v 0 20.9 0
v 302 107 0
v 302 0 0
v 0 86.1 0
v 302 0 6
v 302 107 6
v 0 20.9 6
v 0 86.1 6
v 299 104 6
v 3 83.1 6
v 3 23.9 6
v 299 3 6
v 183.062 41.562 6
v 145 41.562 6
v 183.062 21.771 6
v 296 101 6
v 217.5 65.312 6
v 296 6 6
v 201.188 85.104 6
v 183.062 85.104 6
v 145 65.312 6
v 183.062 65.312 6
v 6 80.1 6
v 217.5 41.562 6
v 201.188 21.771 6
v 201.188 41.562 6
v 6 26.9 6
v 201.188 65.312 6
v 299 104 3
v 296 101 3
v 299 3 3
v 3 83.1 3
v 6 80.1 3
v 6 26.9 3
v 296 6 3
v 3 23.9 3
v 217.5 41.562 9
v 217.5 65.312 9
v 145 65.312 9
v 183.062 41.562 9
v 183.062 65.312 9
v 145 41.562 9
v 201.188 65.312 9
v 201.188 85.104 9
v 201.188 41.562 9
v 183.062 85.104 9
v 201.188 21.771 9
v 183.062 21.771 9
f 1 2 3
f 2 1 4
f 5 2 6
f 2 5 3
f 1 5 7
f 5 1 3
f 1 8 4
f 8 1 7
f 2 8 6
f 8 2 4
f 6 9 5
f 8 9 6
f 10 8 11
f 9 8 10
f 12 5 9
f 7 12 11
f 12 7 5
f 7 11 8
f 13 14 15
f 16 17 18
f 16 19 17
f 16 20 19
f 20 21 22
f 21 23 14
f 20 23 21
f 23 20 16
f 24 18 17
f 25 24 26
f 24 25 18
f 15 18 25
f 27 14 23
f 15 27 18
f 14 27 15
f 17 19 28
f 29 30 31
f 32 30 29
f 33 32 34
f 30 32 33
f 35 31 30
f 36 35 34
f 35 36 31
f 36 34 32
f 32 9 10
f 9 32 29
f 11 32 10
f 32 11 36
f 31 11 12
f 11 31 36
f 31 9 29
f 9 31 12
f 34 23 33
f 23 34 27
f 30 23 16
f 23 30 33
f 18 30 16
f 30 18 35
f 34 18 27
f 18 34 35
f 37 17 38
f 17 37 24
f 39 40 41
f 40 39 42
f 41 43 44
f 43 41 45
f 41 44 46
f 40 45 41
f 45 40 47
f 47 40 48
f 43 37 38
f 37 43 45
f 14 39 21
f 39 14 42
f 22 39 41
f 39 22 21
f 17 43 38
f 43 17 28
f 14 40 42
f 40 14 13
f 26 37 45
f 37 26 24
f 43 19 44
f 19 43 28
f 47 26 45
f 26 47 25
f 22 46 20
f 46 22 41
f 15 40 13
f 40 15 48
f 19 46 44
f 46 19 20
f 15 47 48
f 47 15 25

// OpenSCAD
//+-----------------------------+
//|  OPENSCAD Cerceuil - coffin |
//|    2017 gaziel@gmail.com    |
//+-----------------------------+   

//humain boby standart ( cm:175x55x41 175x60x45 185x55x41 185x60x45 195x55x41 195x60x45)
// barbie, ken  mm : 280*75*45
//classic Gi-joe  mm: 300*75*55
model="lid";//[coffin,lid]
//Coffin or lid type
type="lyonnais";//[parisien,lyonnais,tombeau]
// preview[view:south, tilt:top]
//internal Lenght 
L=290;
// internal lenght
l=95;
// internal height
H=45;
//thinkness
Ep=3;
// ratio 
pouet=0.22;//[0.10:0.01:0.40]
//decoration
croix ="simple";//[none,simple]
//
//text 
//txt="test";

i=l*pouet;
j=L*(1-pouet);

module baseplate(ep){
    if (type=="tombeau"){
        square([L+2*ep,l+2*ep]);
    }
   if (type=="parisien"){ 
       polygon(points=[[0,i],[0,l-i+2*ep],[j+ep,l+2*ep],[L+2*ep,l-i+2*ep],[L+2*ep,i],[j+ep,0]], paths=[[0,1,2,3,4,5,,6]]);
   }
   
      if (type=="lyonnais"){ 
          polygon(points=[[0,i],[0,l-i+2*ep],[L++2*ep,l+2*ep],[L+2*ep,0]], paths=[[0,1,2,3]]);
   }
    
}
module base(Ep){
    linear_extrude(height = Ep, center = false, convexity = 10)baseplate(Ep);
}
module tourplate(){
    difference(){
        baseplate(Ep);
        translate([Ep,Ep,0])baseplate(0);
    }
    
}
module tour(H){
    linear_extrude(height = H, center = false, convexity = 10)tourplate();
}
module coffre(){
    base(Ep);
    translate([0,0,Ep])tour(H);
}
module couvercle(){
    
    if (type=="tombeau"){
        hull(){
            base(2*Ep);
            color("pink")translate([Ep,Ep,7*Ep])base(Ep);
        }
        translate([(L/2)+Ep,(l/2)+2*Ep,7*Ep])croix();
    }   
    else{
        difference(){
            base(2*Ep);
            translate([Ep,Ep,Ep])tour(Ep);
       
        }
        translate([L/2+L/8,l/2+l/16,Ep])croix();
    }   

}
module croix(){
    if (croix =="simple"){
            translate([0,0,Ep*1.5])cube([L/4,l/4,Ep],center=true);
            translate([L/10-L/16,0,Ep*1.5])cube([L/16,l/1.5,Ep],center=true);
           }
       }

//coffre();//test
//baseplate(Ep);//test
//baseextru();//test
//tour();//test
if (model=="coffin"){
coffre();
}
else{
couvercle();
}
